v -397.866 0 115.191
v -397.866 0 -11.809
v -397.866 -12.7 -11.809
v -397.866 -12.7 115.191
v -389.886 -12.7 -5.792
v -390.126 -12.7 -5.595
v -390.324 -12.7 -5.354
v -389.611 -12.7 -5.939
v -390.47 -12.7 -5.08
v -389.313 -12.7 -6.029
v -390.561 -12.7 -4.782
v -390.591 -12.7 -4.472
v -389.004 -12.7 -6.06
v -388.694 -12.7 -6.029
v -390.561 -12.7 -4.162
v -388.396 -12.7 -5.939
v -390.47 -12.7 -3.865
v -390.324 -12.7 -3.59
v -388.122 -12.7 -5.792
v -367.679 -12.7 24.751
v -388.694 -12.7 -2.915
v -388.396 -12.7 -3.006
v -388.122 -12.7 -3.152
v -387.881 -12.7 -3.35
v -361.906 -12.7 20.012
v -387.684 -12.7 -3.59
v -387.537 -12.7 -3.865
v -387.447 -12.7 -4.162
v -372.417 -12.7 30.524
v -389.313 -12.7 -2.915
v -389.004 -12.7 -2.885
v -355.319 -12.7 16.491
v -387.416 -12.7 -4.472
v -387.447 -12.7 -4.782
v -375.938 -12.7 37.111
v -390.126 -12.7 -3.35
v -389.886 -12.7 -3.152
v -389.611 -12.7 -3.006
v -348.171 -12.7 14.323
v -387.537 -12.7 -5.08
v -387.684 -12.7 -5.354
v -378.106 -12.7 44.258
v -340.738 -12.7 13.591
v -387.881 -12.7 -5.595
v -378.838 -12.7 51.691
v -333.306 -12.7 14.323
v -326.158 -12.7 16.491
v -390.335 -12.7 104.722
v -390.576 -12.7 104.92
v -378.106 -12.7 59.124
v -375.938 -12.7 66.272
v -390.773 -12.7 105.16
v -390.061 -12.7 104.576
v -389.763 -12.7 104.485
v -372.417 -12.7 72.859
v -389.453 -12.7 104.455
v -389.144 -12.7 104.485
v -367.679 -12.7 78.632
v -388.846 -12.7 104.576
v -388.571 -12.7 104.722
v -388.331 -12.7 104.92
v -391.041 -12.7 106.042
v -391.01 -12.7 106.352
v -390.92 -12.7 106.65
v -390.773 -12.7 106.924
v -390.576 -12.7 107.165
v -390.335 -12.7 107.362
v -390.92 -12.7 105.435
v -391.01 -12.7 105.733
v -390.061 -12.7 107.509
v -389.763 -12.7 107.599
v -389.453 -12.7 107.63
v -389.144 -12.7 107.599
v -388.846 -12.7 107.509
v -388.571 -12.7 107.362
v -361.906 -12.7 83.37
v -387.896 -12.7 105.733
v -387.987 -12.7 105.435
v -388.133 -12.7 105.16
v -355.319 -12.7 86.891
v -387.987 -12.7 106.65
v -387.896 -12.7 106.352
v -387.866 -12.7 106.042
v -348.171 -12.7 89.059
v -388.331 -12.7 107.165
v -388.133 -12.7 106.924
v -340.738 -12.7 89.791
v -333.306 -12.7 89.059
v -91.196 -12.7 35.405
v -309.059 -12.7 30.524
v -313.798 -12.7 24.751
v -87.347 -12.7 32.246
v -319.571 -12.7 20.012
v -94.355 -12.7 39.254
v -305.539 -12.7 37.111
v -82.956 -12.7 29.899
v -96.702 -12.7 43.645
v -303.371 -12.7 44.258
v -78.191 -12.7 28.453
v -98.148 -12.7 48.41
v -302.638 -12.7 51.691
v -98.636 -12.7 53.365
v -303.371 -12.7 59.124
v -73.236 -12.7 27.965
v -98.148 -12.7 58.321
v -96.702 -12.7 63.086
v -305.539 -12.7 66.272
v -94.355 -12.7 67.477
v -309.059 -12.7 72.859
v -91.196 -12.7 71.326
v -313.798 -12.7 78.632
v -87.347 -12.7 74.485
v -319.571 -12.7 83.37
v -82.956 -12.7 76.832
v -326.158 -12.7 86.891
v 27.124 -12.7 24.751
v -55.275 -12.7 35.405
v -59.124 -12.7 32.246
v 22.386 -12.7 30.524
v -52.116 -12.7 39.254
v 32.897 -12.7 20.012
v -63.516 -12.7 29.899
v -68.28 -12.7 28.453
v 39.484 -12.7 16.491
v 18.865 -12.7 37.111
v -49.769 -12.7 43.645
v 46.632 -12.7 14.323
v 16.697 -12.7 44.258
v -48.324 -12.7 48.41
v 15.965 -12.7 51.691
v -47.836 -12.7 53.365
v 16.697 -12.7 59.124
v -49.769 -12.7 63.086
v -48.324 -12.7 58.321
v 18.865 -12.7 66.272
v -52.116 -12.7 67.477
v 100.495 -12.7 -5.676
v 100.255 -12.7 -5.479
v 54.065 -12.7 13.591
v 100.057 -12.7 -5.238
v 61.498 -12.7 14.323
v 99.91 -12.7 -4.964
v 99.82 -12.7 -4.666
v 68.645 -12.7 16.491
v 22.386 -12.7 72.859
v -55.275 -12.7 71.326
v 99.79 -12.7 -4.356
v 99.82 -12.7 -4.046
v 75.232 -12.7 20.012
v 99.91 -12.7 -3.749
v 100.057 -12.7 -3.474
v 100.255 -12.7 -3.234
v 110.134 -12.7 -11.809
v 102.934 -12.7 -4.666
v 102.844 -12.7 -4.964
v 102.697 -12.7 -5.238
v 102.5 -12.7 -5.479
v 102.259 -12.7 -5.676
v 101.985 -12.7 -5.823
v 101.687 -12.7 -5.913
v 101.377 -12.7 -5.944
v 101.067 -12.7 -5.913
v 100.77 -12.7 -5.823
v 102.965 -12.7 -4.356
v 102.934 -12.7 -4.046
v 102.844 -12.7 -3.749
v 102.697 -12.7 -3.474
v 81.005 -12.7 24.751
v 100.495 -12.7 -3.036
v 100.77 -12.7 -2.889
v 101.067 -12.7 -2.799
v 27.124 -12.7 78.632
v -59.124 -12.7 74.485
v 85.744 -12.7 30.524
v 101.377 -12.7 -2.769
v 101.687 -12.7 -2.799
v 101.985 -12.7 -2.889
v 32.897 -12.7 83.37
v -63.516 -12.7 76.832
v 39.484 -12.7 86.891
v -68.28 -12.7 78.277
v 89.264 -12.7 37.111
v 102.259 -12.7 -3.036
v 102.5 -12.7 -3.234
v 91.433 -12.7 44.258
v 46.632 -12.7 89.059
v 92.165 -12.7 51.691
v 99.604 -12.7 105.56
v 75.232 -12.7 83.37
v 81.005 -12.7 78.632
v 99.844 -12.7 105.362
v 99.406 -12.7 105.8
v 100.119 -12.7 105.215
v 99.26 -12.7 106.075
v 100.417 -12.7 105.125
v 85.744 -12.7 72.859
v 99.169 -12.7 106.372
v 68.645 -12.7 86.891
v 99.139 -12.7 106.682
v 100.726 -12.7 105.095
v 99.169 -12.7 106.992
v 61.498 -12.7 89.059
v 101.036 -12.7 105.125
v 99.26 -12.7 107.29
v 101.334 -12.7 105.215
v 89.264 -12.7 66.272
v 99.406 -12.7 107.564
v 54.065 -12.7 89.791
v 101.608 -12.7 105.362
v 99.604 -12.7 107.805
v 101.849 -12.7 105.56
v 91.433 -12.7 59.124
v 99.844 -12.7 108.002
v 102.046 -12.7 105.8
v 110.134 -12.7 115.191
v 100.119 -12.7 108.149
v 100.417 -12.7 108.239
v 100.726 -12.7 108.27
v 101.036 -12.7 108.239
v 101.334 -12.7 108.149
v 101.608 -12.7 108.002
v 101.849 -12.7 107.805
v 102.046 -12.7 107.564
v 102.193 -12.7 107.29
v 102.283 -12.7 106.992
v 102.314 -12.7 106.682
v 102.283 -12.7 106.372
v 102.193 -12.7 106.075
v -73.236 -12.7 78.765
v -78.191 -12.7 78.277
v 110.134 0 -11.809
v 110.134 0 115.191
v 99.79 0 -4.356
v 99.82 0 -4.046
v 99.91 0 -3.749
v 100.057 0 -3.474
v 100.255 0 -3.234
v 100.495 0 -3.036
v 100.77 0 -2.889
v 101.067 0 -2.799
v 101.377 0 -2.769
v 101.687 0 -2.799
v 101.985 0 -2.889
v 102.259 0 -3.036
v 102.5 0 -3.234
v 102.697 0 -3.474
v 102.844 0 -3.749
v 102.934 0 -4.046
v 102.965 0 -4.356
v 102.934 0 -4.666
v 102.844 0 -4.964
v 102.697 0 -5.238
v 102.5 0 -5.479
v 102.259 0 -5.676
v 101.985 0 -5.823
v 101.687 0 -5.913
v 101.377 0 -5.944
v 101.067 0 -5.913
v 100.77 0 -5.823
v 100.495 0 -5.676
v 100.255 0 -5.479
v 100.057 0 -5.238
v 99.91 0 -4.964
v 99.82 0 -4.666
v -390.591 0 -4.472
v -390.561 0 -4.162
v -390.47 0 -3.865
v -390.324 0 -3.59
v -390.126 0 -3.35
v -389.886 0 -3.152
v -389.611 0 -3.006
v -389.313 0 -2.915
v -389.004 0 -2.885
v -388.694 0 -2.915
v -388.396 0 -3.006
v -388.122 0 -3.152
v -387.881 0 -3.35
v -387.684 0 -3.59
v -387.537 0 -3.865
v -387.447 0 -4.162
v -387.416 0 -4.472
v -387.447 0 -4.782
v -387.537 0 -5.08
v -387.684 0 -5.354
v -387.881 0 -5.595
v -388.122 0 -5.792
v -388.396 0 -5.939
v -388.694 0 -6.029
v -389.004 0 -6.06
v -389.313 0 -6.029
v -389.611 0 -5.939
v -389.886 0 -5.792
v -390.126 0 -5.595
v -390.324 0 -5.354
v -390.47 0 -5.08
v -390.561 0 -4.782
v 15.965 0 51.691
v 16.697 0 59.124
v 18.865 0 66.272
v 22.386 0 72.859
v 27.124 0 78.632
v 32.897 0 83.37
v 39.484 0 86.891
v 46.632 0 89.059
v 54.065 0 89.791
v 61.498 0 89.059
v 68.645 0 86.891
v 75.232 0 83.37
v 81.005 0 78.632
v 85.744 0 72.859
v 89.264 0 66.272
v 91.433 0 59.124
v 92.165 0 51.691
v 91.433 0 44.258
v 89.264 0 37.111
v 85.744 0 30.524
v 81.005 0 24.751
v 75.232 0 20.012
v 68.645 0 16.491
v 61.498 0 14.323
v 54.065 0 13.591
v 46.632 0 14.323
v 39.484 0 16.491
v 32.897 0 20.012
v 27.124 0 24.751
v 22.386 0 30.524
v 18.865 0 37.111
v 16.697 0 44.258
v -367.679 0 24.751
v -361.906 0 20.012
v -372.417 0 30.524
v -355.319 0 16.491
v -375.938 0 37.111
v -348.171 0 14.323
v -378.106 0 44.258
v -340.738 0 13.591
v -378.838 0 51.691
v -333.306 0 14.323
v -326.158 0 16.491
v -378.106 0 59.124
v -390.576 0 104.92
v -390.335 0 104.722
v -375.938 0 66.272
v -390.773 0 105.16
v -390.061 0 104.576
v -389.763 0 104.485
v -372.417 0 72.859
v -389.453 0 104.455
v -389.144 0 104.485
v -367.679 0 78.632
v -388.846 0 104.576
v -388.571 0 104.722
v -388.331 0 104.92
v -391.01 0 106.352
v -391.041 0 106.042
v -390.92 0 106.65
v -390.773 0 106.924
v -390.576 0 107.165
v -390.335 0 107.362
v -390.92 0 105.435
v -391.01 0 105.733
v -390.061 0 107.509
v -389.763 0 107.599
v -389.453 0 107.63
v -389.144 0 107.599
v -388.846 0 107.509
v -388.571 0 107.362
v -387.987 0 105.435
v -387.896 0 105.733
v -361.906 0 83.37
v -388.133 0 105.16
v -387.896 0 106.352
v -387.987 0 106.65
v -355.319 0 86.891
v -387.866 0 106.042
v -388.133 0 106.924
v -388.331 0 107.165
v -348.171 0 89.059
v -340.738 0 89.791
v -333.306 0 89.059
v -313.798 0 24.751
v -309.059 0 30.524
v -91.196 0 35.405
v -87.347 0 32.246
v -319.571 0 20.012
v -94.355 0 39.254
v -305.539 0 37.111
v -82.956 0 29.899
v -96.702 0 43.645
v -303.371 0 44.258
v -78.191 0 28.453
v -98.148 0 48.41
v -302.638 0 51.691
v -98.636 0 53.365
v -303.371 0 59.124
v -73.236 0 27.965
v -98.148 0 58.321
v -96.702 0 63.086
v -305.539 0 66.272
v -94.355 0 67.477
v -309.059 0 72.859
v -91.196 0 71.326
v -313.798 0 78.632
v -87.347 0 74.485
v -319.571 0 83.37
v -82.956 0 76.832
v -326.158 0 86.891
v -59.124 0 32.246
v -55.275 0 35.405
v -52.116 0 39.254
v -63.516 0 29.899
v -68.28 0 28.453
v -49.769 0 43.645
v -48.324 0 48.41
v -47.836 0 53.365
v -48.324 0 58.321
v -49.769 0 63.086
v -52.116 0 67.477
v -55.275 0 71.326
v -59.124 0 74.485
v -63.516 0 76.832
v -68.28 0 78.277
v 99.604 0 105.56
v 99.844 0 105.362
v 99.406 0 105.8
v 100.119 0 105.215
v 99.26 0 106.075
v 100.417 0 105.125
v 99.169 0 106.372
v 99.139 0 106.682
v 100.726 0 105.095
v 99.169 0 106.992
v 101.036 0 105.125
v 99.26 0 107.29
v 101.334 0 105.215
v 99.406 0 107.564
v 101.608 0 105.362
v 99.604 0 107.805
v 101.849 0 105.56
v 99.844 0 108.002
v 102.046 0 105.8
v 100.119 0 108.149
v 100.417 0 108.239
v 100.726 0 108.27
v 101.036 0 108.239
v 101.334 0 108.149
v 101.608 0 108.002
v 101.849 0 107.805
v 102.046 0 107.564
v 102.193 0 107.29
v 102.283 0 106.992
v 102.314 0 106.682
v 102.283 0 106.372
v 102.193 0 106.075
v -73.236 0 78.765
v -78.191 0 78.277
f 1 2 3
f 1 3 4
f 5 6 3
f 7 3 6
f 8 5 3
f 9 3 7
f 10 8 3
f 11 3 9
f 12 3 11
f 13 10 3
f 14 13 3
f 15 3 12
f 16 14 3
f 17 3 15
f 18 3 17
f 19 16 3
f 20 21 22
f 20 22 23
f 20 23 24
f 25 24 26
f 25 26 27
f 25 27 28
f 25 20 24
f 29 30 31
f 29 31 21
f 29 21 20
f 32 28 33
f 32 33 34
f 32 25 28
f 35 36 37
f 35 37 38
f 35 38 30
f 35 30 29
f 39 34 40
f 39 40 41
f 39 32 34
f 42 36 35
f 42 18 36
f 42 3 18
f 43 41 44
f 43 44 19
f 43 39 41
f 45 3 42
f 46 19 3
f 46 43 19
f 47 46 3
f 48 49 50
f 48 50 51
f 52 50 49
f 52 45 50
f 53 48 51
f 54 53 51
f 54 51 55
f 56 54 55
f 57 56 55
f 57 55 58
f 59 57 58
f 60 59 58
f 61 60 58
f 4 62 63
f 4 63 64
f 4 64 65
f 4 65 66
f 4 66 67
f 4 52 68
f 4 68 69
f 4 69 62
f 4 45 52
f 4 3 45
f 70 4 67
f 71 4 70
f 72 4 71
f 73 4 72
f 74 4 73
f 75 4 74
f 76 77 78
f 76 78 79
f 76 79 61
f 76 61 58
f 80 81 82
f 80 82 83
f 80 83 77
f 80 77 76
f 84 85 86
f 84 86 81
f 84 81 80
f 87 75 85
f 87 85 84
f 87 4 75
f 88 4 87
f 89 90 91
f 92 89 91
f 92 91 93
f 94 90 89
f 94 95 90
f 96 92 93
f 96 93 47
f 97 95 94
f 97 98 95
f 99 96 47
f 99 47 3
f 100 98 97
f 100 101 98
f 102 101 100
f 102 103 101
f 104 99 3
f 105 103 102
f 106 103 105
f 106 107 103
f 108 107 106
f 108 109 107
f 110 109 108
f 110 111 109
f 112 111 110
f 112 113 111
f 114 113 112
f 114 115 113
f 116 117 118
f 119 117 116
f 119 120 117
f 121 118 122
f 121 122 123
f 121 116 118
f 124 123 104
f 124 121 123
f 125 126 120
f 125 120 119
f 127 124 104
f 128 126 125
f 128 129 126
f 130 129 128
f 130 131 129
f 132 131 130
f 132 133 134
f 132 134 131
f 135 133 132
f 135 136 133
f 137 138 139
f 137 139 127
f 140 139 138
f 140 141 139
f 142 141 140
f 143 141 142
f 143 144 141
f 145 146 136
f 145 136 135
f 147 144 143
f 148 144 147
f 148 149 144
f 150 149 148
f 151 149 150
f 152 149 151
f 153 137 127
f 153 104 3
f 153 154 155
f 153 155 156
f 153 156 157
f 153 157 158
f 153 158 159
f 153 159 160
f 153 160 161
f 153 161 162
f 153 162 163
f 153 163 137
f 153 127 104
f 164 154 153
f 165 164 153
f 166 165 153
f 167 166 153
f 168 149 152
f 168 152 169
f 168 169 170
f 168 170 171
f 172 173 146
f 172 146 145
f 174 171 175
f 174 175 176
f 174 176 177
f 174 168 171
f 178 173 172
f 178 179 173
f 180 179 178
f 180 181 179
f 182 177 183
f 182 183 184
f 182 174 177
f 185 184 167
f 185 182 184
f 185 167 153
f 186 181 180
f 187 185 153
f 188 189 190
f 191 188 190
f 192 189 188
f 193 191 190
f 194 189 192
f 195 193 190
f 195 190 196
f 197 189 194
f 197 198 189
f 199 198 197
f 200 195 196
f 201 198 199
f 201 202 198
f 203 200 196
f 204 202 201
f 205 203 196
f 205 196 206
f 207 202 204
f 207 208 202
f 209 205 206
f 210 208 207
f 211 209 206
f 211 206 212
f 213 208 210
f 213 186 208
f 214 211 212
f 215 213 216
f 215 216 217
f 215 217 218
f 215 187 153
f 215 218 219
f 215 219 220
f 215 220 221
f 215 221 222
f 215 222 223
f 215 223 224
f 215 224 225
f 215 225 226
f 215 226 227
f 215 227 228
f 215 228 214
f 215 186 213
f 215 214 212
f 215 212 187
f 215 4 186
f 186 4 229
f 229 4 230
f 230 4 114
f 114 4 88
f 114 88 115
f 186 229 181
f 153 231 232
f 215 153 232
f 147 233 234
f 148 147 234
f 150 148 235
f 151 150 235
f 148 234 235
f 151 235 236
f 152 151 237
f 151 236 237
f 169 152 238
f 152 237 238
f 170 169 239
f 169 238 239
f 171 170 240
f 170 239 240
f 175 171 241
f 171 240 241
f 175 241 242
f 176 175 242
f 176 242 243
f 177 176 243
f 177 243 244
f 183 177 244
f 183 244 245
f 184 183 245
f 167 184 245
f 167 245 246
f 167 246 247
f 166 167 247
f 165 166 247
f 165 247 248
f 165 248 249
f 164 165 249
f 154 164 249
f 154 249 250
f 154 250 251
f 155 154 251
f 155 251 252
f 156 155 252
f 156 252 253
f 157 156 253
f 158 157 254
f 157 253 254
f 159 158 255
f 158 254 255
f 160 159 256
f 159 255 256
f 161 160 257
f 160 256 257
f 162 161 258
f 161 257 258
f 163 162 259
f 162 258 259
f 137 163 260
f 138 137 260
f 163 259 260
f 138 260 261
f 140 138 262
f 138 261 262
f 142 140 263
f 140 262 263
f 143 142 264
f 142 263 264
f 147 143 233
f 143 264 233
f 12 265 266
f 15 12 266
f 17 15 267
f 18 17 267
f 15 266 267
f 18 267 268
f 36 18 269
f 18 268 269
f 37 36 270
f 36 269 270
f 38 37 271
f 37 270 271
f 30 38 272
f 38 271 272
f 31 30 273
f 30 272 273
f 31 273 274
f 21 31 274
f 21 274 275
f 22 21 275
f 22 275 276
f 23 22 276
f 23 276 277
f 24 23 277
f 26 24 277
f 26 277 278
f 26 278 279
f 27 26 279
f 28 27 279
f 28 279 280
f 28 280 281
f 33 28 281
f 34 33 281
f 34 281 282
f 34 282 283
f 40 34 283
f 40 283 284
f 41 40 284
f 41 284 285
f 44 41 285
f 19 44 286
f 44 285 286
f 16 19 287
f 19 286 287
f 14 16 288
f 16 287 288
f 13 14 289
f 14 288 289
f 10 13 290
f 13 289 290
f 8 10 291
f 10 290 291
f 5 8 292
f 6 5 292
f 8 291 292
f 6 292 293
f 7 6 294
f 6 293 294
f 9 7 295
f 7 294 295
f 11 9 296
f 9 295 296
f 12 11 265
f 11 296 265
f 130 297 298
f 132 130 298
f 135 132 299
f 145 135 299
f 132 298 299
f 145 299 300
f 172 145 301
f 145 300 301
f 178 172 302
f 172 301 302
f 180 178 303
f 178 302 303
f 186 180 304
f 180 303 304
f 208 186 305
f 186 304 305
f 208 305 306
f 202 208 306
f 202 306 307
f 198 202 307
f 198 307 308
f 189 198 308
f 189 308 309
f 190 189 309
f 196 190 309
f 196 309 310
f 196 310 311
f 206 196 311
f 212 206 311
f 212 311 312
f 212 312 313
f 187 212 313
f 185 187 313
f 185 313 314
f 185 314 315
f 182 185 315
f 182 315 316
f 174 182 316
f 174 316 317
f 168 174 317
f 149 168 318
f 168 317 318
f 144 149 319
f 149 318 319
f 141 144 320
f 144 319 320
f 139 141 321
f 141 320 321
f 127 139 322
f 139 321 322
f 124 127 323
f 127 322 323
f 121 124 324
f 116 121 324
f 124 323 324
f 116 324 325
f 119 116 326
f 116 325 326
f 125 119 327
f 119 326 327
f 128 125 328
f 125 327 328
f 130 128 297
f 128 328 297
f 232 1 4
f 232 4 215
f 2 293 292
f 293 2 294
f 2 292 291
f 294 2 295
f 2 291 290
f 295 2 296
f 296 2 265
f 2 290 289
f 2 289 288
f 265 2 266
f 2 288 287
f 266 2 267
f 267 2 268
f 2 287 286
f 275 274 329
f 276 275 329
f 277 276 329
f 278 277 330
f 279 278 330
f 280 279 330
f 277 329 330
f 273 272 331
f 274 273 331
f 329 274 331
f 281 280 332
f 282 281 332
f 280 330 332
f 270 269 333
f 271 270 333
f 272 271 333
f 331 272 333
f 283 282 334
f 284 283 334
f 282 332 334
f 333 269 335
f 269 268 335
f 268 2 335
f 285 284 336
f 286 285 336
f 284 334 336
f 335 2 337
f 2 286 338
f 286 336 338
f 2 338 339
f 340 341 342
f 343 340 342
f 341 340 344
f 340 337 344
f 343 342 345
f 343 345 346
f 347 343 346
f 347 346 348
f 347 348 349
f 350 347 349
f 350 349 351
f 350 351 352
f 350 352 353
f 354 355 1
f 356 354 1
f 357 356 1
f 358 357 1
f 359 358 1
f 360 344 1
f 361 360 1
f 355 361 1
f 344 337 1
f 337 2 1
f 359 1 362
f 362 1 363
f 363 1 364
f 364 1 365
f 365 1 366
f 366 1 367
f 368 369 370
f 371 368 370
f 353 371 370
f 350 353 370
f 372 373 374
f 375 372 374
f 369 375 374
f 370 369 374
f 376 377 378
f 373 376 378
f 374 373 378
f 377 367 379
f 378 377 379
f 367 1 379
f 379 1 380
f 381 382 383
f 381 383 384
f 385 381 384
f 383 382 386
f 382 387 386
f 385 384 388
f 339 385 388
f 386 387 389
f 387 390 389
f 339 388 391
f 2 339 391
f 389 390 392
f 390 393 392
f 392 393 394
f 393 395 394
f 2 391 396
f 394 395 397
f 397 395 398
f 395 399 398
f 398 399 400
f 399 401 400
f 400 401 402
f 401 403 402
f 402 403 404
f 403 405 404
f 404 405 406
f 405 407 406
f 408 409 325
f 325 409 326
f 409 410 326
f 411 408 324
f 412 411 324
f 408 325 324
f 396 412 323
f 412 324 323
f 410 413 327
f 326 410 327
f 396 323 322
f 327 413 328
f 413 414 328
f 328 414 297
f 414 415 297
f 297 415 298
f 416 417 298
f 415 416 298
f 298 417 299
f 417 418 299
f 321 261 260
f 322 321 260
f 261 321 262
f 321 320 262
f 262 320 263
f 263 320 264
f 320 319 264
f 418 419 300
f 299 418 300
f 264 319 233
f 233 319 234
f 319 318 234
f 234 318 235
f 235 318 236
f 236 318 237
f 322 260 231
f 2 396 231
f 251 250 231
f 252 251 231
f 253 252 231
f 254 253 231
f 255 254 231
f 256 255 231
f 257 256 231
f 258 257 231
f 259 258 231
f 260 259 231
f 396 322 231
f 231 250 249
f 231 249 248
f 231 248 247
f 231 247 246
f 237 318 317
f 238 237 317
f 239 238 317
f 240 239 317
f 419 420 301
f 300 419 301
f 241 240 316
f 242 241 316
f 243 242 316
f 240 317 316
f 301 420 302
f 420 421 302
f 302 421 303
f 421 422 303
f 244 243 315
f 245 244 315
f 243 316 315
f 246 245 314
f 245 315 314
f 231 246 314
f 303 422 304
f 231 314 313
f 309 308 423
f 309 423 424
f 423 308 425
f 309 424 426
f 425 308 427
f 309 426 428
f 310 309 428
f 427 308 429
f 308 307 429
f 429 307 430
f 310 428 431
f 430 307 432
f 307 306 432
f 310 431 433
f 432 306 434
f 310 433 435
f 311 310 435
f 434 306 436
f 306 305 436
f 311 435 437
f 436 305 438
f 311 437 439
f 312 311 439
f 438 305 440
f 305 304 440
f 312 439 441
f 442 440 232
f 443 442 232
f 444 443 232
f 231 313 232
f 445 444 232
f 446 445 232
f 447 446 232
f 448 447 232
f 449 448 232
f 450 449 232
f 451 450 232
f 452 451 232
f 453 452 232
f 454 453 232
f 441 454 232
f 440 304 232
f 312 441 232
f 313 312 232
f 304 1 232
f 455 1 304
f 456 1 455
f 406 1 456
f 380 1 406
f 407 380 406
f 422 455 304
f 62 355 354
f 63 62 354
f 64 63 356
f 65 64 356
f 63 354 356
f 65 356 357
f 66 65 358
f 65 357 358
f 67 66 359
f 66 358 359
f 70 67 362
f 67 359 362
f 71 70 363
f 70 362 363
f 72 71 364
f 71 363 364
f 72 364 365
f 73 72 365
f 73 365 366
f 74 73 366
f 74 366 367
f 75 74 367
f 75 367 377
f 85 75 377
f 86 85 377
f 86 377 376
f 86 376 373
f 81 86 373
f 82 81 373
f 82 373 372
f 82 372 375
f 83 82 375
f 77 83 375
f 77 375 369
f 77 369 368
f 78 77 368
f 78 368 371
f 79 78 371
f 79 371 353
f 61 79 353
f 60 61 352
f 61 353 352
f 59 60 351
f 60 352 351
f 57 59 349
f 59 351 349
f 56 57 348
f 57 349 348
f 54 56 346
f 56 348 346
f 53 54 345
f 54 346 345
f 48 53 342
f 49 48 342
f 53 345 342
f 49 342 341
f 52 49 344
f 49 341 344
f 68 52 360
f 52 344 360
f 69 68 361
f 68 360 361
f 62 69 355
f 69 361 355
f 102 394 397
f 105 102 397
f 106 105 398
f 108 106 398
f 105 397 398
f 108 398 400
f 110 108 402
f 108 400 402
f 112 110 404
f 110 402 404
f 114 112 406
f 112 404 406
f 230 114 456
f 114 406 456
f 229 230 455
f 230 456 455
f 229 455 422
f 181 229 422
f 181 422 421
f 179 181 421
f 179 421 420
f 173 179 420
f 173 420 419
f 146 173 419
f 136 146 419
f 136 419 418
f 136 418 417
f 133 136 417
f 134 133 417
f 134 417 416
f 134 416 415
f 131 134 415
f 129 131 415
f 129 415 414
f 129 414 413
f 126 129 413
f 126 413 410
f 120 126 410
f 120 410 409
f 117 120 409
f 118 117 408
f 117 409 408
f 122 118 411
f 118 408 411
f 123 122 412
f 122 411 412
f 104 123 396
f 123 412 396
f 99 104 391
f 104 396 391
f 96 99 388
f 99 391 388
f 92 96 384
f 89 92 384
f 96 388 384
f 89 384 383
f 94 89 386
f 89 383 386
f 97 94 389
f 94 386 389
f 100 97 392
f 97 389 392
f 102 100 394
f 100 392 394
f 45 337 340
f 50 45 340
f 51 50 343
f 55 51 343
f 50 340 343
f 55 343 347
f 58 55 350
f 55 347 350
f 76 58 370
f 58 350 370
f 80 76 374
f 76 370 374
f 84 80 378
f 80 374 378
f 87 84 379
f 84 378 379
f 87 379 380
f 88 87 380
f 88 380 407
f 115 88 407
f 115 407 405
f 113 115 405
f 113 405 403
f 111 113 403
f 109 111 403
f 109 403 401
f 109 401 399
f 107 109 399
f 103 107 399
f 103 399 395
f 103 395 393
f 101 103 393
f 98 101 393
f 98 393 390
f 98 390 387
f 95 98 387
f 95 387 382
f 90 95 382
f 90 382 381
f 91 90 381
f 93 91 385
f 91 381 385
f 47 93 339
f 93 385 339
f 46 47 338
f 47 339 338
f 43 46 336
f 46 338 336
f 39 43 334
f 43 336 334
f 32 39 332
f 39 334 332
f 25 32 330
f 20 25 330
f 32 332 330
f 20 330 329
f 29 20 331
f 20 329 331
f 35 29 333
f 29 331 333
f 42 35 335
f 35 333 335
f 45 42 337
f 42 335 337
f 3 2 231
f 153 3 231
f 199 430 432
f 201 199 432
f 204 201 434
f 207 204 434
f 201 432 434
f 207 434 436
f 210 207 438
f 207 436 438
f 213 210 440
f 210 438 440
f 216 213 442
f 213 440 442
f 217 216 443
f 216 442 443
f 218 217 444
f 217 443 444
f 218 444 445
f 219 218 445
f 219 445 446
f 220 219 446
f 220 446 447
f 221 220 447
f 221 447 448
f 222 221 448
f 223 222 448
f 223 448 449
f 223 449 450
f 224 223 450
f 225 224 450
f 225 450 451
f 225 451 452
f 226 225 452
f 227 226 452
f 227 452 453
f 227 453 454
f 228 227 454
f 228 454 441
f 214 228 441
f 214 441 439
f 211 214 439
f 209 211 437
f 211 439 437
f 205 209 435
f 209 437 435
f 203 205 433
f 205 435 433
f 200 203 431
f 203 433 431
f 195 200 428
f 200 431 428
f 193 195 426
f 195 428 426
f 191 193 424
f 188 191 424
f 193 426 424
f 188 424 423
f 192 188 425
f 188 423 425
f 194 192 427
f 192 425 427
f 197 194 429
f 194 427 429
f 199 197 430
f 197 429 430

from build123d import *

# Parameters (mm, degrees)
F0_W     = 508
F0_H     = 127
F1_DEPTH = 12.7
F3_D     = 3.175
F5_D     = 3.175
F7_D     = 76.2
F9_D     = 50.8
F11_D    = 76.2


with BuildPart() as f1:
    # F0 (on Front) → F1 (new body)
    with BuildSketch(Plane.XZ):
        with Locations((-143.865749, 51.691295)):
            Rectangle(F0_W, F0_H)
    extrude(amount=F1_DEPTH)

    # F3 (through all)
    with Locations(Plane.XZ.offset(12.7)):
        with Locations((100.726366, 106.68204)):
            Hole(F3_D / 2)

    # F5 (through all)
    with Locations(Plane.XZ.offset(12.7)):
        with Locations((101.377115, -4.356061), (-389.453292, 106.042355), (-389.003724, -4.472178)):
            Hole(F5_D / 2)

    # F7 (through all)
    with Locations(Plane.XZ.offset(12.7)):
        with Locations((-340.738475, 51.691294)):
            Hole(F7_D / 2)

    # F9 (through all)
    with Locations(Plane.XZ.offset(12.7)):
        with Locations((-73.235735, 53.365439)):
            Hole(F9_D / 2)

    # F11 (through all)
    with Locations(Plane.XZ.offset(12.7)):
        with Locations((54.064672, 51.691295)):
            Hole(F11_D / 2)


solid = f1.part
